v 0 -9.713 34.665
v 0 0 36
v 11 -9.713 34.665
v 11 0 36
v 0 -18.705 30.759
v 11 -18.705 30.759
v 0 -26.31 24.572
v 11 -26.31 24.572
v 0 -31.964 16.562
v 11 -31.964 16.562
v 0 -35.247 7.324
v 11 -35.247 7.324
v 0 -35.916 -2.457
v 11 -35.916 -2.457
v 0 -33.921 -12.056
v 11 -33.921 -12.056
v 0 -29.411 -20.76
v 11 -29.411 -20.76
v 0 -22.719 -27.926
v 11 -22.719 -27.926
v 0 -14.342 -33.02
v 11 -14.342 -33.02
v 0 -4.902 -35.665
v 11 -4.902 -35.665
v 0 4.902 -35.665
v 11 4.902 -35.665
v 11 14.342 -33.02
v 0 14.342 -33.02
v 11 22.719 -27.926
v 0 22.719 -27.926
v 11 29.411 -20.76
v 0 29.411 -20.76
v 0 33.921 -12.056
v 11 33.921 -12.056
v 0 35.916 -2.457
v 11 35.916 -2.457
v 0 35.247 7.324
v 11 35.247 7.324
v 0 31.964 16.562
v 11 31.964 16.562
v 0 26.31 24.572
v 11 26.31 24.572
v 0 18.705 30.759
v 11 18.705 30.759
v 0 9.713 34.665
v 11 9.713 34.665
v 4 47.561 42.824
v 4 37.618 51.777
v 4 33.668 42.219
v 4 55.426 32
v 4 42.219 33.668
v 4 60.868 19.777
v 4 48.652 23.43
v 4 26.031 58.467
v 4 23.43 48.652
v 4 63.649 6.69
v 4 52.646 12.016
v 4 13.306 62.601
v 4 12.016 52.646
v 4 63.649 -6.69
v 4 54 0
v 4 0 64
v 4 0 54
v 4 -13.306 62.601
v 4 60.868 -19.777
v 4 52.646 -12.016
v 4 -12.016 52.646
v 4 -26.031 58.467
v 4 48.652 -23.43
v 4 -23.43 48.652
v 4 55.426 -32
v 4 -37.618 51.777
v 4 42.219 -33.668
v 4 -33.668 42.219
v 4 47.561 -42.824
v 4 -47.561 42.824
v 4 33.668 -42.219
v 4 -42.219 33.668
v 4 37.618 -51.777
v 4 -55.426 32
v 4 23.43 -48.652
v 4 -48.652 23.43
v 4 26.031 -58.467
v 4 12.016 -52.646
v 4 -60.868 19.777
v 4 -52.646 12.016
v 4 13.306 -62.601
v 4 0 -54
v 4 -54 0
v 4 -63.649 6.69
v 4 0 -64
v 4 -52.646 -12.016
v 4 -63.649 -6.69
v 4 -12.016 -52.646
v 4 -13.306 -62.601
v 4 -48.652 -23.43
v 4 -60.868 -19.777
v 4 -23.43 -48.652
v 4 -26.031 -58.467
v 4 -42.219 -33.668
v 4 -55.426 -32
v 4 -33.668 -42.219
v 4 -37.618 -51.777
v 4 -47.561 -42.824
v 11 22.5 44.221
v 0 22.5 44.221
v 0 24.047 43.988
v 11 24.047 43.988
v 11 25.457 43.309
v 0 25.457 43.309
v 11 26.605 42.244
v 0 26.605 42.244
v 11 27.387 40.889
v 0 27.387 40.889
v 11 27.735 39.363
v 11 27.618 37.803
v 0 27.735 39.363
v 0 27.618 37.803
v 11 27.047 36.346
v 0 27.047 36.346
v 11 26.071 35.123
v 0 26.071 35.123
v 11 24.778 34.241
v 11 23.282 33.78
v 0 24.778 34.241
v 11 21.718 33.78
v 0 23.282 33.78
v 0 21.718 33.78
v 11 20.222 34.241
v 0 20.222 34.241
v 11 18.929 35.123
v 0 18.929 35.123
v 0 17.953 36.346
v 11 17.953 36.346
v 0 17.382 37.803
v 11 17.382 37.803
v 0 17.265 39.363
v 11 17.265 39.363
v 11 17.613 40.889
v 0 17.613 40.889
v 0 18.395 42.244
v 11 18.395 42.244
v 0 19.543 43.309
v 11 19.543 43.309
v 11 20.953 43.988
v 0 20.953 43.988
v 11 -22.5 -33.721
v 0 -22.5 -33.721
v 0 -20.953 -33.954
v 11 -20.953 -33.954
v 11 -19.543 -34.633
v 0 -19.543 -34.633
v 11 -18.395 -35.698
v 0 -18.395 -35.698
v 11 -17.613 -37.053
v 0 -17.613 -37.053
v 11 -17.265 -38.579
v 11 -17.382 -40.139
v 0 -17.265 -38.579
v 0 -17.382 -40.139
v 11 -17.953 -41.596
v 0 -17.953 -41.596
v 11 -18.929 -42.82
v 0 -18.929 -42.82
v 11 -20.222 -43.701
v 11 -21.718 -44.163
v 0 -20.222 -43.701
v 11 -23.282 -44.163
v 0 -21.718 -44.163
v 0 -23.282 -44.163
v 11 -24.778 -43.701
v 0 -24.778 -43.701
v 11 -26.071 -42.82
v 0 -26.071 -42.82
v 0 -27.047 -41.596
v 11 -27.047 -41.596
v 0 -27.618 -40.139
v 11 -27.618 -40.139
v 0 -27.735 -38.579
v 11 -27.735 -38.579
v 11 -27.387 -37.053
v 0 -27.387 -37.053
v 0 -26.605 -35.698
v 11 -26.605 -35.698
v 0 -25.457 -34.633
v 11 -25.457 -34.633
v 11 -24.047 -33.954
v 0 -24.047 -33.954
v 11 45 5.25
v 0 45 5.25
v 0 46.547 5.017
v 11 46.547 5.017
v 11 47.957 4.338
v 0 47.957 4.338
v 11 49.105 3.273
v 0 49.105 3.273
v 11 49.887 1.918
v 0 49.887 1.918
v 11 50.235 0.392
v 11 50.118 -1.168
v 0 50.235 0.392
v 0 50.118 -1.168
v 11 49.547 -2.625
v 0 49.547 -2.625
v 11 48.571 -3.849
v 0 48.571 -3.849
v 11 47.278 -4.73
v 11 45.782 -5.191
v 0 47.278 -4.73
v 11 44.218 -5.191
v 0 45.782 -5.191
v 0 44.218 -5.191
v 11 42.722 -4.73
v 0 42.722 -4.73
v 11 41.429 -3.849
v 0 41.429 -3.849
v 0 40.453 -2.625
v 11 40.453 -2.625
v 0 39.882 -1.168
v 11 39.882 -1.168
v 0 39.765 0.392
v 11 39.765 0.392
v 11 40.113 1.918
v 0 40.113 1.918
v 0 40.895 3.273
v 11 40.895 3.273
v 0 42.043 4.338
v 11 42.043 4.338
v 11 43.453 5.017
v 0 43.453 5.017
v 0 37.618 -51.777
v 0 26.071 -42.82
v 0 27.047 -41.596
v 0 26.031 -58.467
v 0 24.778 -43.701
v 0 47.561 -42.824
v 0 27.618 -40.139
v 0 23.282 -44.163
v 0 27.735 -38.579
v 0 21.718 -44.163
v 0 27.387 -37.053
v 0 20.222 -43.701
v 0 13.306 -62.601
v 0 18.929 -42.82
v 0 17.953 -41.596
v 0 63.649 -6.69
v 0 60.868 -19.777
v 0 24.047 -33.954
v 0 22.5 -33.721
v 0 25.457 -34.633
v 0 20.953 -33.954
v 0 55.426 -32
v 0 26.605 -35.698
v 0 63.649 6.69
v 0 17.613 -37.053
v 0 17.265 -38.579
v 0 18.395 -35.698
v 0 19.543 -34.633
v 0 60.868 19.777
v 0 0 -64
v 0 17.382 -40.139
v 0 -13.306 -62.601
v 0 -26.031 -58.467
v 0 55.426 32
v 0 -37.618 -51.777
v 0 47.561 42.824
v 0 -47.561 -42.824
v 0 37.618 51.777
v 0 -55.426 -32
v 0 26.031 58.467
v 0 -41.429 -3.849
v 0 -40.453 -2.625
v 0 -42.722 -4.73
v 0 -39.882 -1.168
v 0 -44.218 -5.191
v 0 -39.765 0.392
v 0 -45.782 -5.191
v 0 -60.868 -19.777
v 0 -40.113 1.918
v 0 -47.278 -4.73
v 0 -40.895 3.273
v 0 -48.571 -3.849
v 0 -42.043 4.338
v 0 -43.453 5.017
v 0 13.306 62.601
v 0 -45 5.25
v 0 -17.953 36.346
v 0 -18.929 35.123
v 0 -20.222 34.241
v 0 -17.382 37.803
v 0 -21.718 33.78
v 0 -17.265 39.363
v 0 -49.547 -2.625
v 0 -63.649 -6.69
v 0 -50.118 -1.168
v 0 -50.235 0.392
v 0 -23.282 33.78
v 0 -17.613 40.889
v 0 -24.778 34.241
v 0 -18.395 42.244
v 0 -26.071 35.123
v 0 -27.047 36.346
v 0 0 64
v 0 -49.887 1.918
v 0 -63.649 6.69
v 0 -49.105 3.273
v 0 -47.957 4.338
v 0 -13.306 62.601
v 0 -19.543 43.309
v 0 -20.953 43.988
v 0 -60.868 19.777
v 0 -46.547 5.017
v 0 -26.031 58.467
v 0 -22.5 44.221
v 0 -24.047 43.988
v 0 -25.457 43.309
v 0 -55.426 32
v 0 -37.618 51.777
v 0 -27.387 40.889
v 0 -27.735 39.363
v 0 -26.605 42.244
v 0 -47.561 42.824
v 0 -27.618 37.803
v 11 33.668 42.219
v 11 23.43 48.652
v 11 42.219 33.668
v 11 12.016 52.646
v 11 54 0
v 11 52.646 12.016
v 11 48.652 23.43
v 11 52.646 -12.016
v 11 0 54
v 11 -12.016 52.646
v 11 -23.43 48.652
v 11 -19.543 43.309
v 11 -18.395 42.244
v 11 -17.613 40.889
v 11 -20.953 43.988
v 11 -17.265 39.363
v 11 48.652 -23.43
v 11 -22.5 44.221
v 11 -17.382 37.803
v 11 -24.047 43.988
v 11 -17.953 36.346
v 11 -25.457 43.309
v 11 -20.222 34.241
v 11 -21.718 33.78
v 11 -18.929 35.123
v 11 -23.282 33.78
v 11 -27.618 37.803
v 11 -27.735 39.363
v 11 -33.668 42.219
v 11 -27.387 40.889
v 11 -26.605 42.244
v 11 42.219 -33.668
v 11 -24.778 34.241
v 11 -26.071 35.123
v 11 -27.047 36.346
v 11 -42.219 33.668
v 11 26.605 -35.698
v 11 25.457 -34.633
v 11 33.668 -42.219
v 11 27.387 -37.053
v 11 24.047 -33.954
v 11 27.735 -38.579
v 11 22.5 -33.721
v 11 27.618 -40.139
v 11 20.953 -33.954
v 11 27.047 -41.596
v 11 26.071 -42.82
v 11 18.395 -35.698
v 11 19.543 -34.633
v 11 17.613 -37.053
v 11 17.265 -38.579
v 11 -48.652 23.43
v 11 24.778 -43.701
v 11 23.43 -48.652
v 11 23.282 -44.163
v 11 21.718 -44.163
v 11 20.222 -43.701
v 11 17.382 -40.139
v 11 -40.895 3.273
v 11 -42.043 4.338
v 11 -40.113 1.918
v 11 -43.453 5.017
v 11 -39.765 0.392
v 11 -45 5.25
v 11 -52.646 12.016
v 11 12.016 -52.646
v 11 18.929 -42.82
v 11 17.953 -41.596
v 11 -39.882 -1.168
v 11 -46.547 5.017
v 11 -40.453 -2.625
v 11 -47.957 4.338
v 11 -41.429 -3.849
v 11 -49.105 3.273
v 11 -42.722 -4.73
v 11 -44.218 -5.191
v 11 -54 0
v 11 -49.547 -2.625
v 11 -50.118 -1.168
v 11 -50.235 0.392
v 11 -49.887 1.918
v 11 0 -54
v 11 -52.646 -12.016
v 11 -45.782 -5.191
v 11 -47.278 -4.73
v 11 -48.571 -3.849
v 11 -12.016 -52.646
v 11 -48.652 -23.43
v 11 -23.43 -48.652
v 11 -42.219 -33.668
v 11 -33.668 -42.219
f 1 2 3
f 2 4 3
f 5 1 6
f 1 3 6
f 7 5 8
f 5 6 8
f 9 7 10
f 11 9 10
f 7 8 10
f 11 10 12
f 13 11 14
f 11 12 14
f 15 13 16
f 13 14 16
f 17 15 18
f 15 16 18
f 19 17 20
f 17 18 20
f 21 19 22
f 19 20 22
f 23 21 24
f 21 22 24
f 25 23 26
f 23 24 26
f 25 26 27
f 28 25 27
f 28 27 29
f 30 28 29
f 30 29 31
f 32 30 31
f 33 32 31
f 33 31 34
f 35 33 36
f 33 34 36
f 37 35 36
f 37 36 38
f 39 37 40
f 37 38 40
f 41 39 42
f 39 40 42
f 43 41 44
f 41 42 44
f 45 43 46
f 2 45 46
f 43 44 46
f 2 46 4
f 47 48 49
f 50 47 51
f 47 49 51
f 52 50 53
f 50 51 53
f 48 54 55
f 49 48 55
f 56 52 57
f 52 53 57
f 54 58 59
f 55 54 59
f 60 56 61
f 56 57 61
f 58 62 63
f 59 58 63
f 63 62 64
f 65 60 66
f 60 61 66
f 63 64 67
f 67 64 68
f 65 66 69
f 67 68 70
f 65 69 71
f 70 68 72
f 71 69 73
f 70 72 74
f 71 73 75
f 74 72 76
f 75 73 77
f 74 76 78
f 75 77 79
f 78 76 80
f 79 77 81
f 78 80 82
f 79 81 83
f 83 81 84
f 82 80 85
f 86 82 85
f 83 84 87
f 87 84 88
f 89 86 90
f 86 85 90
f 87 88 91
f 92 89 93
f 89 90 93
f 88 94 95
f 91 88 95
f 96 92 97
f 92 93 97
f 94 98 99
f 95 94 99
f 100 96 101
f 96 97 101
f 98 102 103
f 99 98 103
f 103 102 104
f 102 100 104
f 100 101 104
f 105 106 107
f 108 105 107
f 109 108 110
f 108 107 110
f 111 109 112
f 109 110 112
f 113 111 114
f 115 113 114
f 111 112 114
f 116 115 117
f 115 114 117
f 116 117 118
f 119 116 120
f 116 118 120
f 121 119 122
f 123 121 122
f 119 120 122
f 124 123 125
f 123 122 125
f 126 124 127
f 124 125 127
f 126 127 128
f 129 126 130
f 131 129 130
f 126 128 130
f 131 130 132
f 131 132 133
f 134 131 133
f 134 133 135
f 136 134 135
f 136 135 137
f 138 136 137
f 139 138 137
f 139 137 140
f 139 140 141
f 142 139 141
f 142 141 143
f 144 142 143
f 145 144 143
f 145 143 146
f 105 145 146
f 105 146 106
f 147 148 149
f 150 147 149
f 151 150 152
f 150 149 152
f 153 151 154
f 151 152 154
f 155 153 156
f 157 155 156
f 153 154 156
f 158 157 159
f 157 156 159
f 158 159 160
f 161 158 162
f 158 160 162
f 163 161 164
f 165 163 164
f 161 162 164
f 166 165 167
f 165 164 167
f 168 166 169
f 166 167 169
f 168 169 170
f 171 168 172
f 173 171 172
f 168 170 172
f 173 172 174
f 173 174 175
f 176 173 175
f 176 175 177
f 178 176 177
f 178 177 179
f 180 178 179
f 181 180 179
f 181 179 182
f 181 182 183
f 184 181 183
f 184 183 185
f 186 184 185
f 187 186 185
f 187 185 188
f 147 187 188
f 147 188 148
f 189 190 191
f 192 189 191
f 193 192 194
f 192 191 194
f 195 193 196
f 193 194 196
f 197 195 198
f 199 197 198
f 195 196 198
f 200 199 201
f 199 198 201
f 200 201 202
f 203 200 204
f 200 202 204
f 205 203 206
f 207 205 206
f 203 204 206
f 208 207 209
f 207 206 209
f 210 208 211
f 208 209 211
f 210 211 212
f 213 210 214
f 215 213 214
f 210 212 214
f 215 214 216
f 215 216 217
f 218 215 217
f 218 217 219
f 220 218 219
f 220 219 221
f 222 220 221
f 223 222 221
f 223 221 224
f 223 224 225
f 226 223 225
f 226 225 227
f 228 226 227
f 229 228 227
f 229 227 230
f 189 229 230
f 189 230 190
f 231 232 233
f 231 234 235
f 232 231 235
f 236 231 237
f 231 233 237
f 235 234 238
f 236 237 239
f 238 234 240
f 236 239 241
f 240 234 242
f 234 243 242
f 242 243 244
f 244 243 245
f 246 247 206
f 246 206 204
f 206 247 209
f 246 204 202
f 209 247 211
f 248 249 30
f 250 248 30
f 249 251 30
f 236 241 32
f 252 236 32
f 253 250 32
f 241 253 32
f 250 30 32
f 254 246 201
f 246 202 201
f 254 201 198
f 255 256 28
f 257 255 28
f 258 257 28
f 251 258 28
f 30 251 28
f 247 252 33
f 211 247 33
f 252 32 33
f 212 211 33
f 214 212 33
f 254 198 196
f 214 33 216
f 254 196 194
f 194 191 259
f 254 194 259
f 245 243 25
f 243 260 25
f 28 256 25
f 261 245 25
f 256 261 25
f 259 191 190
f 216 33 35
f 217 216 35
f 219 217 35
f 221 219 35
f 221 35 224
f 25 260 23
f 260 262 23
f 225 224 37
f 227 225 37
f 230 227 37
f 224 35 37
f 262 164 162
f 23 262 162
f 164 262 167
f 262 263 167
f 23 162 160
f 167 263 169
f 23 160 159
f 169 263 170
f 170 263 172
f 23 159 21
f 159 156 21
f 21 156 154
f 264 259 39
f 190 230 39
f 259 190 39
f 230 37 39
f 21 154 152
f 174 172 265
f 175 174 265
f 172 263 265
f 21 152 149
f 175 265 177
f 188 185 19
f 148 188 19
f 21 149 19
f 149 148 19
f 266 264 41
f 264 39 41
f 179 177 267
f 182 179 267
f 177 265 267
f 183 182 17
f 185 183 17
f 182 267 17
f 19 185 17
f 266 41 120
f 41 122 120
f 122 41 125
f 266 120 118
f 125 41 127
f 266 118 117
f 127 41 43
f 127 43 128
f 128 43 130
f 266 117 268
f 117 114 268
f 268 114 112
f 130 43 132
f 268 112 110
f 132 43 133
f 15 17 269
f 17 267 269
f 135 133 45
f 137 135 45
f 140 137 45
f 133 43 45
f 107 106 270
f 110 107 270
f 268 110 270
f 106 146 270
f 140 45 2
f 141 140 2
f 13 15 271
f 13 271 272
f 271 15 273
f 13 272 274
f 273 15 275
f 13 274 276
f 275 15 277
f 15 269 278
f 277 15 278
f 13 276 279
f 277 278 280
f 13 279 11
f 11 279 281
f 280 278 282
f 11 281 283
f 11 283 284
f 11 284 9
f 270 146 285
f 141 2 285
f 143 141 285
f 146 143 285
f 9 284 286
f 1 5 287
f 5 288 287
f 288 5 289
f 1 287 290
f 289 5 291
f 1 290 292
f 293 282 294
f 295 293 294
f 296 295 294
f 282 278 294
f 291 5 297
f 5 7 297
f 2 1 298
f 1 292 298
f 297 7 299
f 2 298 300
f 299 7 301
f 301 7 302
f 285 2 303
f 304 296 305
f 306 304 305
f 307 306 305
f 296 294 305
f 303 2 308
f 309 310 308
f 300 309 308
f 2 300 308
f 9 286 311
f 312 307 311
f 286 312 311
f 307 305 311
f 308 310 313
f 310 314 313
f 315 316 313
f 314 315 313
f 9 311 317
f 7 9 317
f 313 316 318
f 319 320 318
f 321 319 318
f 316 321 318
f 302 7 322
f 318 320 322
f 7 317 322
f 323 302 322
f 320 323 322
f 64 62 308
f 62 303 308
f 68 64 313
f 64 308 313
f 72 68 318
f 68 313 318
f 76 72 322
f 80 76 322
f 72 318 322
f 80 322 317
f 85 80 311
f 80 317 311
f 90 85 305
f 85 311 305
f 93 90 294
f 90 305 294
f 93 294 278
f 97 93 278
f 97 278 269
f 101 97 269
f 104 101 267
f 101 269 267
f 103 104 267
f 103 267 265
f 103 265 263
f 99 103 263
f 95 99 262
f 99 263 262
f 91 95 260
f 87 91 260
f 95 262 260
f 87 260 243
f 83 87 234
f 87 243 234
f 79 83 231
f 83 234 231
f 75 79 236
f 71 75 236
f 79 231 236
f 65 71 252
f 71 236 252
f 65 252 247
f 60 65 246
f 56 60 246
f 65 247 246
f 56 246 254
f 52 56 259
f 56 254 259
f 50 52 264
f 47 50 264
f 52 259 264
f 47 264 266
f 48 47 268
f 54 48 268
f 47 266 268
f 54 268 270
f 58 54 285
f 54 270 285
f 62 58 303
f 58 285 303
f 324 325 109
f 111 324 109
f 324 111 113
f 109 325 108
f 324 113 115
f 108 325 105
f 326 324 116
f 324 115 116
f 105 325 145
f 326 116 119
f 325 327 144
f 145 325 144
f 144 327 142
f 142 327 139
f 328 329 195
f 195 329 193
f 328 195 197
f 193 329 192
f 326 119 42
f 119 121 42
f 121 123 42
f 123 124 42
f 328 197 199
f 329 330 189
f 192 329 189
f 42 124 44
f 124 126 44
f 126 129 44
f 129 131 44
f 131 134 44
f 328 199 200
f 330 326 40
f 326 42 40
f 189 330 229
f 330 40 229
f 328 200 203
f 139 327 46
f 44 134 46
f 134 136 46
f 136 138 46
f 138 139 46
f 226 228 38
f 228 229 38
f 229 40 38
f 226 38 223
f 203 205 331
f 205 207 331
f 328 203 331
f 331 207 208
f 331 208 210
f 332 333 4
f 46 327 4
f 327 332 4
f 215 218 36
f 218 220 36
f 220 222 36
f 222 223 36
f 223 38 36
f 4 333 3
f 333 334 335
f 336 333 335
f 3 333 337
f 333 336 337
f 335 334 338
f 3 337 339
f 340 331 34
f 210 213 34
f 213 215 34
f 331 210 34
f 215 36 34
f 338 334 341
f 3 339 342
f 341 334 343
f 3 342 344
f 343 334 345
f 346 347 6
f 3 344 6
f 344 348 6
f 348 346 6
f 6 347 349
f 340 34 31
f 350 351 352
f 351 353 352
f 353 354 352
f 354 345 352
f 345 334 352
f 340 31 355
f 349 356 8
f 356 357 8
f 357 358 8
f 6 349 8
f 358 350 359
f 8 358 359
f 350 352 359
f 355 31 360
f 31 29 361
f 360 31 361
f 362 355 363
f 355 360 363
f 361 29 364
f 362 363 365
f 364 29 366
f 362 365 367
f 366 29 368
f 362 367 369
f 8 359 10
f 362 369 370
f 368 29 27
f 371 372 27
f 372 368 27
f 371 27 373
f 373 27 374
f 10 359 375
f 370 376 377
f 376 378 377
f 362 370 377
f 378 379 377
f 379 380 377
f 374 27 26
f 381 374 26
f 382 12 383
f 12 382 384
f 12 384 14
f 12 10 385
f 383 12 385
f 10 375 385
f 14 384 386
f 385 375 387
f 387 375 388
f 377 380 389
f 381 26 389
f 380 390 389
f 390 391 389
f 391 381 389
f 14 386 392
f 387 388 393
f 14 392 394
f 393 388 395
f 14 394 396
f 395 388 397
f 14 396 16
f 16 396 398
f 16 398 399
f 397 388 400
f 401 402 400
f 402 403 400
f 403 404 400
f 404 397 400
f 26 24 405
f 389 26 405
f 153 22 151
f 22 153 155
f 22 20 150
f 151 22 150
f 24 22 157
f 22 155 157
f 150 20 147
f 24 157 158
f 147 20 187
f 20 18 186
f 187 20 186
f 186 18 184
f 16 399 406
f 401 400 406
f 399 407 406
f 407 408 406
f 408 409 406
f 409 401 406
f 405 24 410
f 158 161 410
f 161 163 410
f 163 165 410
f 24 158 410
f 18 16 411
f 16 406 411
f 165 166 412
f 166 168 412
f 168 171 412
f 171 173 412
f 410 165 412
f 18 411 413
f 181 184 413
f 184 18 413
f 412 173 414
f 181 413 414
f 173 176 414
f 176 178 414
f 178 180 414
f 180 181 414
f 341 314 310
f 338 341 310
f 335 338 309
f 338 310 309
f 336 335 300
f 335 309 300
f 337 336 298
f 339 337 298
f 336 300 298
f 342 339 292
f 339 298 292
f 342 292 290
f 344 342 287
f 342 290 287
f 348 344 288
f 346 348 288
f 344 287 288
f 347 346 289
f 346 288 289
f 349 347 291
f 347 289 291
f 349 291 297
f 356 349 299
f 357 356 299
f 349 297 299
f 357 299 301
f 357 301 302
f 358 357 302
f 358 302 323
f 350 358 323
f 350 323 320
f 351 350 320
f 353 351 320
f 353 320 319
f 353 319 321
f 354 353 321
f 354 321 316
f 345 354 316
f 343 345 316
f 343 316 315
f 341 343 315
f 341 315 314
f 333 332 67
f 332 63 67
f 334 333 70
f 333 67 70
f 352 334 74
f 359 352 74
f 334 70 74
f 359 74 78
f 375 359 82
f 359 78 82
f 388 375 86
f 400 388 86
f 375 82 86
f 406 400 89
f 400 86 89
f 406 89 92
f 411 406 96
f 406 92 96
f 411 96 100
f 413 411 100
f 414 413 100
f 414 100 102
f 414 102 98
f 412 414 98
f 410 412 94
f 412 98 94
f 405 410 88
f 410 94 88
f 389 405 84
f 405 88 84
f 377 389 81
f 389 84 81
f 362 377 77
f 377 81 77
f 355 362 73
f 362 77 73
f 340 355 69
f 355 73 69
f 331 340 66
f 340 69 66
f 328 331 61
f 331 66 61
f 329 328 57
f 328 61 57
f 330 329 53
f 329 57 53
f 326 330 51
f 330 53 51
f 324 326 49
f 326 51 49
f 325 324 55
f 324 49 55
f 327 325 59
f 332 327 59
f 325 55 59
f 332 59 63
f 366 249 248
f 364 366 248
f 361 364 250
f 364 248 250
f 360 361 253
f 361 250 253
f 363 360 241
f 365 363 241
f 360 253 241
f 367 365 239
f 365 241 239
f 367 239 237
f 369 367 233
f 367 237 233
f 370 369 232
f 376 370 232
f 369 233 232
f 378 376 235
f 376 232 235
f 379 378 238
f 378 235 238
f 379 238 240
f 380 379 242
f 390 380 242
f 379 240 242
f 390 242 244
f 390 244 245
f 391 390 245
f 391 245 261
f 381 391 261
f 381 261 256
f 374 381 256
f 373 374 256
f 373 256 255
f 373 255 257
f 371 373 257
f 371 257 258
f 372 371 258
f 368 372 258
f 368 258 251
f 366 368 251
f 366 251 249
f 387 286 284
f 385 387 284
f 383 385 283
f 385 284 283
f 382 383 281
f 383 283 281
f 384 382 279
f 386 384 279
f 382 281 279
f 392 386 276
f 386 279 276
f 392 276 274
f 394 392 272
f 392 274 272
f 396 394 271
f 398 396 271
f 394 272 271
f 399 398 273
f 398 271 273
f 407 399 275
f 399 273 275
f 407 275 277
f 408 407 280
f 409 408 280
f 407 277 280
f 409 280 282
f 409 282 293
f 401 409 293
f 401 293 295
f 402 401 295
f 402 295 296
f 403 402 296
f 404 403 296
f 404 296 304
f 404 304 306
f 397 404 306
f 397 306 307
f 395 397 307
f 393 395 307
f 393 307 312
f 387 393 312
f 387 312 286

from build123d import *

# Parameters (mm, degrees)
M10_CLEARANCE_HOLE1_D = 10.5


with BuildPart() as part:
    # Sketch1 → Revolve1 (revolve)
    with BuildSketch(Plane(origin=(0, 0, 0), x_dir=(1, 0, 0), z_dir=(0, 1, 0)), mode=Mode.PRIVATE) as revolve1_sk:
        Polygon((0, 54), (0, 36), (11, 36), (11, 54), (4, 54), (4, 64), (0, 64), align=None)
    revolve(revolve1_sk.sketch.rotate(Axis((-0.5, 0, 0), (1, 0, 0)), 180), axis=Axis((-0.5, 0, 0), (1, 0, 0)))

    # M10 Clearance Hole1 (through all)
    with Locations(Plane(origin=(11, 0, 0), x_dir=(0, 0, -1), z_dir=(1, 0, 0))):
        with Locations((-38.97114317, 22.5), (0, 45), (38.97114317, 22.5), (38.97114317, -22.5), (0, -45), (-38.97114317, -22.5)):
            Hole(M10_CLEARANCE_HOLE1_D / 2)


solid = part.part
